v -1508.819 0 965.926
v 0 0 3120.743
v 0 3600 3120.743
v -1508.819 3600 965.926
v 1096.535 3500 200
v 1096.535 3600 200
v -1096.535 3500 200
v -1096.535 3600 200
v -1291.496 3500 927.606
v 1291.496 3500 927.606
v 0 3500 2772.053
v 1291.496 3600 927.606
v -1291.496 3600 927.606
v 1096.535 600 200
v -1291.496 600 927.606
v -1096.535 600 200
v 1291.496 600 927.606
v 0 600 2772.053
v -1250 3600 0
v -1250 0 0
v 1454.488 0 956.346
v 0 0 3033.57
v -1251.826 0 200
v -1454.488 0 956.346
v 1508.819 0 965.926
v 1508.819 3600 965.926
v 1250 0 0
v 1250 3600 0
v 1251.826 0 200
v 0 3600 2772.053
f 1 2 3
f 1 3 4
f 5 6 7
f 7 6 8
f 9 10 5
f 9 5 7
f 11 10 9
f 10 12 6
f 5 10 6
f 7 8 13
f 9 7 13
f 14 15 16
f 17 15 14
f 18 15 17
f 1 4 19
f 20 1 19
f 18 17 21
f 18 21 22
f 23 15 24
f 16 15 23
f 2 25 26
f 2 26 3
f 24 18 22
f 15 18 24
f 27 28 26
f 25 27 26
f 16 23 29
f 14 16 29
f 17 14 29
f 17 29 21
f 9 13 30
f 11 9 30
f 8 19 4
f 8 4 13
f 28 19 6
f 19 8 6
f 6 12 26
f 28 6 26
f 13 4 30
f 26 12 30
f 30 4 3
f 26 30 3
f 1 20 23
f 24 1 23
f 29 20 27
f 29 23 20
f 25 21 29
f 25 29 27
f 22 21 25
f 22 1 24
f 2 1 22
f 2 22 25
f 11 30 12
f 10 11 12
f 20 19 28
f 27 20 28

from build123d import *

# Parameters (mm, degrees)
F1_DEPTH = 3600
F2_T     = -200
F3_DEPTH = 3000
F4_SIZE2 = 599.99999
F4_SIZE  = 149.99999
F6_DEPTH = 100


# Not quite as in the source:
# - a fillet or chamfer is up to 0.001 mm smaller than in the source, because OpenCascade refuses the exact size


with BuildPart() as f1:
    # F0 (on Front) → F1 (new body)
    with BuildSketch(Plane.XZ):
        Polygon((1508.8190451025, 965.9258262891), (0, 3120.7427380868), (-1508.8190451025, 965.9258262891), (-1250, 0), (0, 0), (1250, 0), align=None)
    extrude(amount=-F1_DEPTH)

    # F2
    f2_openings = [f1.faces().sort_by_distance(p)[0] for p in [
        (0, 0, 1149.918376),
    ]]
    offset(amount=F2_T, openings=f2_openings)

    # F3 (add): a face of the model
    f3_faces = [f1.faces().sort_by_distance(p)[0] for p in [
        (0, 3600, 1149.9183758236),
    ]]
    extrude(f3_faces, amount=-F3_DEPTH)

    # F4 (size 150 and 600 in the source; OpenCascade refuses exactly that, so slightly less here)
    f4_edges = [f1.edges().sort_by_distance(p)[0] for p in [
        (-1194.015311, 0, 563.802957),
        (-645.74801, 0, 1849.829646),
        (645.74801, 0, 1849.829646),
        (1194.015311, 0, 563.802957),
    ]]
    f4_side = f1.faces().sort_by_distance((718.849289, 0, 2018.434739))[0]
    chamfer(f4_edges, length=F4_SIZE, length2=F4_SIZE2, reference=f4_side)

    # F5 (on face) → F6 (cut)
    with BuildSketch(Plane(origin=(0, 3600, 0), x_dir=(-1, 0, 0), z_dir=(0, 1, 0))):
        Polygon((0, 2772.0533789626), (-1291.4960192832, 927.6059133079), (-1096.5346024042, 200), (1096.5346024042, 200), (1291.4960192832, 927.6059133079), align=None)
    extrude(amount=-F6_DEPTH, mode=Mode.SUBTRACT)


solid = f1.part
